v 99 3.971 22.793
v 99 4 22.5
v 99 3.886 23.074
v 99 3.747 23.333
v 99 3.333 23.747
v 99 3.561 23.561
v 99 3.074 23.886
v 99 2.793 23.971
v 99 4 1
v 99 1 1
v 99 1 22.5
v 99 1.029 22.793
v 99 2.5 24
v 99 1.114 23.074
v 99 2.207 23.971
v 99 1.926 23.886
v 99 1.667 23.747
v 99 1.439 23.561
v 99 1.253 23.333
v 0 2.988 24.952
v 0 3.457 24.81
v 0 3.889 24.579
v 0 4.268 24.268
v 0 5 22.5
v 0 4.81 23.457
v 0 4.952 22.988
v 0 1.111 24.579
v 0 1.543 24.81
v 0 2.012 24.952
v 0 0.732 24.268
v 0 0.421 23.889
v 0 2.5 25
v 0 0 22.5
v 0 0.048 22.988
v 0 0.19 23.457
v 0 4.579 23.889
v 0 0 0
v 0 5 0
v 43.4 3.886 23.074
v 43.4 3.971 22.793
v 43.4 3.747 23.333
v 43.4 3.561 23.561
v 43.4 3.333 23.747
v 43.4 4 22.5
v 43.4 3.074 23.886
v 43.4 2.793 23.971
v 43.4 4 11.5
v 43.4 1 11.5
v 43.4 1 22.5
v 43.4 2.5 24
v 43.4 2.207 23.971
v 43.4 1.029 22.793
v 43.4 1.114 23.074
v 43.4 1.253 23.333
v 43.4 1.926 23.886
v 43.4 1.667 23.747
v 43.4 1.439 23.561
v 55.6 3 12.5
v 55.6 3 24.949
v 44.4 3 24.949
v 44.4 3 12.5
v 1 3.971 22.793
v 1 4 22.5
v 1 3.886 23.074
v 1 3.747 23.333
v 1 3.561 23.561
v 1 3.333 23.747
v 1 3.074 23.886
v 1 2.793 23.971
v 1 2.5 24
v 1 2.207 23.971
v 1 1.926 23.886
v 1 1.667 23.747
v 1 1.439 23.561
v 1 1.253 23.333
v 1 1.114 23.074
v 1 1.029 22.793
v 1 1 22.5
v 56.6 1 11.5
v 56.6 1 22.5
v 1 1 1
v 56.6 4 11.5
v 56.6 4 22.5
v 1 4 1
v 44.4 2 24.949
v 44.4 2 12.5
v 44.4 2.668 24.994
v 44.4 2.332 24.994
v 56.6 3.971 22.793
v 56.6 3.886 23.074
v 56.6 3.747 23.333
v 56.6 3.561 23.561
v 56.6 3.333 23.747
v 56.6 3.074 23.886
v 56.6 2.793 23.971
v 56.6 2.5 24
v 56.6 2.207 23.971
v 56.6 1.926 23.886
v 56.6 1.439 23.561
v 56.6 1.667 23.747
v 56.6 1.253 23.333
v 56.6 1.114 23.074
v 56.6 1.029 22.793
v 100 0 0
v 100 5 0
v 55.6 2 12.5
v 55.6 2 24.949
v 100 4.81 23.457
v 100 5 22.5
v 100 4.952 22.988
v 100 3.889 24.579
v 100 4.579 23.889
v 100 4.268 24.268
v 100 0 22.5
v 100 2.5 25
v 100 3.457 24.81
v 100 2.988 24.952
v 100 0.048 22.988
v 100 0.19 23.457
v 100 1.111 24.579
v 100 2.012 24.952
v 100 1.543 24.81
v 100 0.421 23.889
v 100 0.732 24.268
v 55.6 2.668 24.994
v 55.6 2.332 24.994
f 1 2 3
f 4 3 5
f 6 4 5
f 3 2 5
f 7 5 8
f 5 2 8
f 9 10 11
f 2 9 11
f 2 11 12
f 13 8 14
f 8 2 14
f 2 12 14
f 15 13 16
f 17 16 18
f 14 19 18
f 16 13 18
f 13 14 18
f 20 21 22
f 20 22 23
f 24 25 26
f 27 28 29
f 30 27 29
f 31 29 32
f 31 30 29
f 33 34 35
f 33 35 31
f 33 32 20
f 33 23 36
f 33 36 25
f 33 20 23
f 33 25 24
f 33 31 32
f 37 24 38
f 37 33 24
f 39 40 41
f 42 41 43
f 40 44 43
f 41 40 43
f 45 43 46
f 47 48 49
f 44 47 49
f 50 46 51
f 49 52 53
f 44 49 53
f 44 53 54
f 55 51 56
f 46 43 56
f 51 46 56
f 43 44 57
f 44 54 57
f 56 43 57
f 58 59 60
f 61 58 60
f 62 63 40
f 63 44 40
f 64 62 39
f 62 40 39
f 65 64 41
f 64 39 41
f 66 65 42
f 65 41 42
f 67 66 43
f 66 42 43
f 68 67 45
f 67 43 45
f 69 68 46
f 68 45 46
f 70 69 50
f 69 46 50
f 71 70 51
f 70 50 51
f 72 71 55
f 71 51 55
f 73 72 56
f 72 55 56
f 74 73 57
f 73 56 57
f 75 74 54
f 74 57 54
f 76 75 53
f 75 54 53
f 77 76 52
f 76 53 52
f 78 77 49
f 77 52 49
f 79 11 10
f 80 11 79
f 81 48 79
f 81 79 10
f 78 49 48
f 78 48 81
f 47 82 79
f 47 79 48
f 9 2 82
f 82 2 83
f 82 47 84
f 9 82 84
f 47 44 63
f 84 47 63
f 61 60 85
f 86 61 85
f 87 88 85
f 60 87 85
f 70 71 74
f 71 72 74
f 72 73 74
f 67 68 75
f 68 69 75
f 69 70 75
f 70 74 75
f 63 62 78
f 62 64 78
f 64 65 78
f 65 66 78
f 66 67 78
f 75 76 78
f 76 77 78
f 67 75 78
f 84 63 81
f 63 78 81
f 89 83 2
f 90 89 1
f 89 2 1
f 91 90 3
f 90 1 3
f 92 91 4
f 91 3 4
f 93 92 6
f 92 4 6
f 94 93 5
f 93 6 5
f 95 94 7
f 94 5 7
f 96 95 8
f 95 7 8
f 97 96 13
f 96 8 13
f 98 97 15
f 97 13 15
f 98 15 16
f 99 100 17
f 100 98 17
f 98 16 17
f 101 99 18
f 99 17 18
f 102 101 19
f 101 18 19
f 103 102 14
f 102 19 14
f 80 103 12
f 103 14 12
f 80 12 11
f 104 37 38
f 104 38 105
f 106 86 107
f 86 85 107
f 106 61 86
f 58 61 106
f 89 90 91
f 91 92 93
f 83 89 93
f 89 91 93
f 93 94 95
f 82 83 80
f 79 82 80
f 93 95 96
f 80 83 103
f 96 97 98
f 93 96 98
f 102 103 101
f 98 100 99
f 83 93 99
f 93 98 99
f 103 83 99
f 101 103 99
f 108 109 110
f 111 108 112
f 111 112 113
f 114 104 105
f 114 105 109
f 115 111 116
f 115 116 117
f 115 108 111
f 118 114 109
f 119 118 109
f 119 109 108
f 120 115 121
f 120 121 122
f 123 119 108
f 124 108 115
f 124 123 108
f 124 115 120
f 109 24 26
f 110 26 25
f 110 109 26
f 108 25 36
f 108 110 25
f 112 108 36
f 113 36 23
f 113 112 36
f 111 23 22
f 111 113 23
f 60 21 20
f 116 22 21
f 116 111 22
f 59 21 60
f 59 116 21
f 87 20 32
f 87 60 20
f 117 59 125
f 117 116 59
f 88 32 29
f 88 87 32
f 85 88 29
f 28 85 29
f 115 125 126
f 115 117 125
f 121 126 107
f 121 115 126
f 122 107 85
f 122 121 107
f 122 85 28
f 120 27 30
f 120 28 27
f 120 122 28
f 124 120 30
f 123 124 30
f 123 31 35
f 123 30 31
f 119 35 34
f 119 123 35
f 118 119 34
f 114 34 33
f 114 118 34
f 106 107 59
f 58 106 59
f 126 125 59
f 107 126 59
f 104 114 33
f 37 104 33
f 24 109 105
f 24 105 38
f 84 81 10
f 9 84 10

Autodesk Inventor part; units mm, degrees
ref_plane "YZ Plane" through (0, 0, 0) normal (1, 0, 0) x (0, 1, 0)
ref_plane "XZ Plane" through (0, 0, 0) normal (0, 1, 0) x (-1, 0, 0)
ref_plane "XY Plane" through (0, 0, 0) normal (0, 0, 1) x (1, 0, 0)
sketch "Sketch2" plane through (0, 0, 0) normal (0, 1, 0) x (-1, 0, 0)
  line L0 (0, 0) -> (-100, 0)
  line L1 (-100, 0) -> (-100, 25)
  line L2 (-100, 25) -> (0, 25)
  line L3 (0, 25) -> (0, 0)
  dimension "d10" = 100
  dimension "d11" = 25
extrude "Extrusion2" add sketch "Sketch2" along normal blind 5
sketch "Sketch3" plane through (0, 0, 25) normal (0, 0, 1) x (1, 0, 0)
  line L0 (0, 0) -> (100, 0) construction
  line L1 (0, 0) -> (44.4, 0) construction
  line L2 (44.4, 0) -> (44.4, 2) construction
  line L3 (44.4, 2) -> (0, 2) construction
  line L4 (0, 2) -> (0, 0) construction
  line L5 (44.4, 2) -> (55.6, 2)
  line L6 (55.6, 2) -> (55.6, 3)
  line L7 (55.6, 3) -> (44.4, 3)
  line L8 (44.4, 3) -> (44.4, 2)
  dimension "d14" = 44.4
  dimension "d15" = 2
  dimension "d16" = 11.2
  dimension "d17" = 1
extrude "Extrusion3" cut sketch "Sketch3" against normal blind 12.5
fillet "Fillet2" radius 2.5 2 edges at (50, 5, 25) (50, 0, 25)
shell "Shell1" thickness 1 removed faces 0
properties part number "RCPlaneElevator"
